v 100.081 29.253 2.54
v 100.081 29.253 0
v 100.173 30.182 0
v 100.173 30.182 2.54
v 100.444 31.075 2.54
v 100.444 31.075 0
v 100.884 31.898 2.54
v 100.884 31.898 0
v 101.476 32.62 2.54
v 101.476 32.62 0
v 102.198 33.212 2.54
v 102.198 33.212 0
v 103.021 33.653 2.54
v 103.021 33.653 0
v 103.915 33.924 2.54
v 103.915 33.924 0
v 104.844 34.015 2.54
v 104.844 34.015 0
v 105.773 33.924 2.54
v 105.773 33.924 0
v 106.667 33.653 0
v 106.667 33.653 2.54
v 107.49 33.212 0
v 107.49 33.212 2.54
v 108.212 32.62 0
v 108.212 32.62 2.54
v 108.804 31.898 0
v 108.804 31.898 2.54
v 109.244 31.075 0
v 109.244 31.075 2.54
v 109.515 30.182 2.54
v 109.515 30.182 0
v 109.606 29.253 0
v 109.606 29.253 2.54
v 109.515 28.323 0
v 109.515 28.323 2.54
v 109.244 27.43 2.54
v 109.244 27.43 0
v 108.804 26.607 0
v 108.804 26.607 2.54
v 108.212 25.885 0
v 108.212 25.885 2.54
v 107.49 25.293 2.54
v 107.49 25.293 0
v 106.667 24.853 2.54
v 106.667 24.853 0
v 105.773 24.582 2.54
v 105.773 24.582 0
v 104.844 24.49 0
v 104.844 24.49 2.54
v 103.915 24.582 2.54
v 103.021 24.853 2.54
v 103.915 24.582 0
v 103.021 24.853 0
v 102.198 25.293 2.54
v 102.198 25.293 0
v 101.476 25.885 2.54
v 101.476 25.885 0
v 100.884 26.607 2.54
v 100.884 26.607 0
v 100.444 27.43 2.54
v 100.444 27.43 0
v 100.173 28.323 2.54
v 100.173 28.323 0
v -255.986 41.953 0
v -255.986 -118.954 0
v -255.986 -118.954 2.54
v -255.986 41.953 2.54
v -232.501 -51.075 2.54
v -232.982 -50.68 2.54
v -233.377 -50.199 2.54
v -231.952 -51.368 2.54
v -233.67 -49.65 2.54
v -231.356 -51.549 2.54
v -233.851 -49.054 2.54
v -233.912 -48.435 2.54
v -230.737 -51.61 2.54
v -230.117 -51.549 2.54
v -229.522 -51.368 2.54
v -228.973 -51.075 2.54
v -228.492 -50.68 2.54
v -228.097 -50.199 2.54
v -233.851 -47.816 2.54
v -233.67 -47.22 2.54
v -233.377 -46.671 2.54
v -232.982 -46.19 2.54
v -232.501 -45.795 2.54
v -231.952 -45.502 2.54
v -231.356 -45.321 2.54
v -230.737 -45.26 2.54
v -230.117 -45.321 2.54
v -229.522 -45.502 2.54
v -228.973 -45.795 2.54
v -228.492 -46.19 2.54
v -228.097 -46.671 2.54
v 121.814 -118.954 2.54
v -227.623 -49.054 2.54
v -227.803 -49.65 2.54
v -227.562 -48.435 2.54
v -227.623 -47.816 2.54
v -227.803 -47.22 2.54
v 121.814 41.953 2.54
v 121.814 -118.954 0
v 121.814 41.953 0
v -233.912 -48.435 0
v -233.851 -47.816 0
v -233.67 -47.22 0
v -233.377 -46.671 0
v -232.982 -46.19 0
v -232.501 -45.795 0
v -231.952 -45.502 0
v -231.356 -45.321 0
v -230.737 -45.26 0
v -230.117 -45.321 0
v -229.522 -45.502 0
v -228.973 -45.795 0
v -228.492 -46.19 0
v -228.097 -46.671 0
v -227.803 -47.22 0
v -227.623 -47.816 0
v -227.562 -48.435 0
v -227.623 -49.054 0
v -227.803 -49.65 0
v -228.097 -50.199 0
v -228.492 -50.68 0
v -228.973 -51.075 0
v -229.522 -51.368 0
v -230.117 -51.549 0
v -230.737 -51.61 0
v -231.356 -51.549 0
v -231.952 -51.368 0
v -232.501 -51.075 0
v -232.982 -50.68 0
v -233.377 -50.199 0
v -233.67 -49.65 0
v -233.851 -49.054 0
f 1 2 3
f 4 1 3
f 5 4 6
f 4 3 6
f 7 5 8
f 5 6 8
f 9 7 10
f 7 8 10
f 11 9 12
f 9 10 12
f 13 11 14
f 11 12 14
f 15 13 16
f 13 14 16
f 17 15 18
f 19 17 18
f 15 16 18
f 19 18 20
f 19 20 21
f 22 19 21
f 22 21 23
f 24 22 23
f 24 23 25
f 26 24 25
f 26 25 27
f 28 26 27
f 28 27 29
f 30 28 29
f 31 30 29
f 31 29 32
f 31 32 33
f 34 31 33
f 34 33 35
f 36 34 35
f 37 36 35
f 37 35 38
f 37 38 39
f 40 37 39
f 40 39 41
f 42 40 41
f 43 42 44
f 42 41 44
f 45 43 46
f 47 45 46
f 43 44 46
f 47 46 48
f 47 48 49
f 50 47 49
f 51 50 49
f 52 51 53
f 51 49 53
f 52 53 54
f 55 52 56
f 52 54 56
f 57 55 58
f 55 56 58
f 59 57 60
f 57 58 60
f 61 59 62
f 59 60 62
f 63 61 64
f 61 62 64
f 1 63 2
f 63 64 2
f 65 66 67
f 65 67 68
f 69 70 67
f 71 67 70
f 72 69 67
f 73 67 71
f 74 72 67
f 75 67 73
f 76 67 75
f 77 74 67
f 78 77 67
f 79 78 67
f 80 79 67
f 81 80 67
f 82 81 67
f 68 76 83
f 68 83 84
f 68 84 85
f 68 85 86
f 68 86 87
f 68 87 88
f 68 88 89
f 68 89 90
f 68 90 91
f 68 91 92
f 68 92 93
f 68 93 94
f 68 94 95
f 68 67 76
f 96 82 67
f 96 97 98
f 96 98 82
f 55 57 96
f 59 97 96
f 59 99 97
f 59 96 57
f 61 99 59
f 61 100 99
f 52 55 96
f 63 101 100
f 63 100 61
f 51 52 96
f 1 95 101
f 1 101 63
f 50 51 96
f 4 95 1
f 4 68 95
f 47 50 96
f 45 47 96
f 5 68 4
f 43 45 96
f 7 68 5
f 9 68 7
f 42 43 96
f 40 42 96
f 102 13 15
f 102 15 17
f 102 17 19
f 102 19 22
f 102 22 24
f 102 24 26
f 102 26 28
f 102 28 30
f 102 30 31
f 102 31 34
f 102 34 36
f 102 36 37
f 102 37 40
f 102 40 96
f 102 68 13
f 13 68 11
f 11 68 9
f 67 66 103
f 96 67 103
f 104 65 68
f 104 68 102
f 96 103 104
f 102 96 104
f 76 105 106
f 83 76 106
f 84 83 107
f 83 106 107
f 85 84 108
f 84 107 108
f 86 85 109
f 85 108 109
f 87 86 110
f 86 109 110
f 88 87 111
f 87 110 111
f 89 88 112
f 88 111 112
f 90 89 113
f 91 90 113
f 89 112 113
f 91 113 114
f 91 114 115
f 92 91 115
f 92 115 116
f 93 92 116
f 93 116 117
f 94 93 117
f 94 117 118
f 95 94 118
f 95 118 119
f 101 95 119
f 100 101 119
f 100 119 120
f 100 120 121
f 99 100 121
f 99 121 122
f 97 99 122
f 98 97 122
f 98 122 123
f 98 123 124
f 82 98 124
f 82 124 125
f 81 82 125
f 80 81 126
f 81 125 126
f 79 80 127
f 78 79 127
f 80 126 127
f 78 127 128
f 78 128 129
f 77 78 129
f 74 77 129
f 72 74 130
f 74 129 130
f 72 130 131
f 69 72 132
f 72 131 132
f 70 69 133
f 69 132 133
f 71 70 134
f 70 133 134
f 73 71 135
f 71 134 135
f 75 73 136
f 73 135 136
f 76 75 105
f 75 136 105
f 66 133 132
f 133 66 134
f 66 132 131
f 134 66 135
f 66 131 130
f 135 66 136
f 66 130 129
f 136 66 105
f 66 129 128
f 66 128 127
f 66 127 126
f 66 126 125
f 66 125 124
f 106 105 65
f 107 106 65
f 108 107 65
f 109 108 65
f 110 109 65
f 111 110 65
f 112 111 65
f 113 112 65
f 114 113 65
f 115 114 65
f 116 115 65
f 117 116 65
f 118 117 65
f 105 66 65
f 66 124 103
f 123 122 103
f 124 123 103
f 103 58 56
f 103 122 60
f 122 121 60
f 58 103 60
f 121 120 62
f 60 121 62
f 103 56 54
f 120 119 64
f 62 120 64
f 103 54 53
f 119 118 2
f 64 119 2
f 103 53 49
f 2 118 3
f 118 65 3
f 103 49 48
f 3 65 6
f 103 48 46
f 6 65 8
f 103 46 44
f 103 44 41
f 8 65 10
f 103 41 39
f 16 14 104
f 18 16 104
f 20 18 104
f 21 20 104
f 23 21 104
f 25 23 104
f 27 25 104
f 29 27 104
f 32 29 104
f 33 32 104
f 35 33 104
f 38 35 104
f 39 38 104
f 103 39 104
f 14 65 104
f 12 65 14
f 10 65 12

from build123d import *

# Parameters (mm, degrees)
SKETCH1_W           = 377.799442515
SKETCH1_H           = 160.906327865
BOSS_EXTRUDE1_DEPTH = 2.54
SKETCH2_R           = 4.7625
CUT_EXTRUDE1_DEPTH  = 283.285560089
SKETCH3_R           = 3.175
CUT_EXTRUDE2_DEPTH  = 283.285560089


with BuildPart() as part:
    # Sketch1 → Boss-Extrude1 (new body)
    with BuildSketch(Plane.XY):
        with Locations((-67.085990584, -38.500613509)):
            Rectangle(SKETCH1_W, SKETCH1_H)
    extrude(amount=BOSS_EXTRUDE1_DEPTH)

    # Sketch2 → Cut-Extrude1 (cut, through all)
    with BuildSketch(Plane(origin=(0, 0, 0), x_dir=(-1, 0, 0), z_dir=(0, 0, -1))):
        with Locations((-104.843972106, 29.252550423)):
            Circle(SKETCH2_R)
    extrude(amount=-CUT_EXTRUDE1_DEPTH, mode=Mode.SUBTRACT)

    # Sketch3 → Cut-Extrude2 (cut, through all)
    with BuildSketch(Plane(origin=(0, 0, 0), x_dir=(-1, 0, 0), z_dir=(0, 0, -1))):
        with Locations((230.736599113, -48.434957303)):
            Circle(SKETCH3_R)
    extrude(amount=-CUT_EXTRUDE2_DEPTH, mode=Mode.SUBTRACT)


solid = part.part
